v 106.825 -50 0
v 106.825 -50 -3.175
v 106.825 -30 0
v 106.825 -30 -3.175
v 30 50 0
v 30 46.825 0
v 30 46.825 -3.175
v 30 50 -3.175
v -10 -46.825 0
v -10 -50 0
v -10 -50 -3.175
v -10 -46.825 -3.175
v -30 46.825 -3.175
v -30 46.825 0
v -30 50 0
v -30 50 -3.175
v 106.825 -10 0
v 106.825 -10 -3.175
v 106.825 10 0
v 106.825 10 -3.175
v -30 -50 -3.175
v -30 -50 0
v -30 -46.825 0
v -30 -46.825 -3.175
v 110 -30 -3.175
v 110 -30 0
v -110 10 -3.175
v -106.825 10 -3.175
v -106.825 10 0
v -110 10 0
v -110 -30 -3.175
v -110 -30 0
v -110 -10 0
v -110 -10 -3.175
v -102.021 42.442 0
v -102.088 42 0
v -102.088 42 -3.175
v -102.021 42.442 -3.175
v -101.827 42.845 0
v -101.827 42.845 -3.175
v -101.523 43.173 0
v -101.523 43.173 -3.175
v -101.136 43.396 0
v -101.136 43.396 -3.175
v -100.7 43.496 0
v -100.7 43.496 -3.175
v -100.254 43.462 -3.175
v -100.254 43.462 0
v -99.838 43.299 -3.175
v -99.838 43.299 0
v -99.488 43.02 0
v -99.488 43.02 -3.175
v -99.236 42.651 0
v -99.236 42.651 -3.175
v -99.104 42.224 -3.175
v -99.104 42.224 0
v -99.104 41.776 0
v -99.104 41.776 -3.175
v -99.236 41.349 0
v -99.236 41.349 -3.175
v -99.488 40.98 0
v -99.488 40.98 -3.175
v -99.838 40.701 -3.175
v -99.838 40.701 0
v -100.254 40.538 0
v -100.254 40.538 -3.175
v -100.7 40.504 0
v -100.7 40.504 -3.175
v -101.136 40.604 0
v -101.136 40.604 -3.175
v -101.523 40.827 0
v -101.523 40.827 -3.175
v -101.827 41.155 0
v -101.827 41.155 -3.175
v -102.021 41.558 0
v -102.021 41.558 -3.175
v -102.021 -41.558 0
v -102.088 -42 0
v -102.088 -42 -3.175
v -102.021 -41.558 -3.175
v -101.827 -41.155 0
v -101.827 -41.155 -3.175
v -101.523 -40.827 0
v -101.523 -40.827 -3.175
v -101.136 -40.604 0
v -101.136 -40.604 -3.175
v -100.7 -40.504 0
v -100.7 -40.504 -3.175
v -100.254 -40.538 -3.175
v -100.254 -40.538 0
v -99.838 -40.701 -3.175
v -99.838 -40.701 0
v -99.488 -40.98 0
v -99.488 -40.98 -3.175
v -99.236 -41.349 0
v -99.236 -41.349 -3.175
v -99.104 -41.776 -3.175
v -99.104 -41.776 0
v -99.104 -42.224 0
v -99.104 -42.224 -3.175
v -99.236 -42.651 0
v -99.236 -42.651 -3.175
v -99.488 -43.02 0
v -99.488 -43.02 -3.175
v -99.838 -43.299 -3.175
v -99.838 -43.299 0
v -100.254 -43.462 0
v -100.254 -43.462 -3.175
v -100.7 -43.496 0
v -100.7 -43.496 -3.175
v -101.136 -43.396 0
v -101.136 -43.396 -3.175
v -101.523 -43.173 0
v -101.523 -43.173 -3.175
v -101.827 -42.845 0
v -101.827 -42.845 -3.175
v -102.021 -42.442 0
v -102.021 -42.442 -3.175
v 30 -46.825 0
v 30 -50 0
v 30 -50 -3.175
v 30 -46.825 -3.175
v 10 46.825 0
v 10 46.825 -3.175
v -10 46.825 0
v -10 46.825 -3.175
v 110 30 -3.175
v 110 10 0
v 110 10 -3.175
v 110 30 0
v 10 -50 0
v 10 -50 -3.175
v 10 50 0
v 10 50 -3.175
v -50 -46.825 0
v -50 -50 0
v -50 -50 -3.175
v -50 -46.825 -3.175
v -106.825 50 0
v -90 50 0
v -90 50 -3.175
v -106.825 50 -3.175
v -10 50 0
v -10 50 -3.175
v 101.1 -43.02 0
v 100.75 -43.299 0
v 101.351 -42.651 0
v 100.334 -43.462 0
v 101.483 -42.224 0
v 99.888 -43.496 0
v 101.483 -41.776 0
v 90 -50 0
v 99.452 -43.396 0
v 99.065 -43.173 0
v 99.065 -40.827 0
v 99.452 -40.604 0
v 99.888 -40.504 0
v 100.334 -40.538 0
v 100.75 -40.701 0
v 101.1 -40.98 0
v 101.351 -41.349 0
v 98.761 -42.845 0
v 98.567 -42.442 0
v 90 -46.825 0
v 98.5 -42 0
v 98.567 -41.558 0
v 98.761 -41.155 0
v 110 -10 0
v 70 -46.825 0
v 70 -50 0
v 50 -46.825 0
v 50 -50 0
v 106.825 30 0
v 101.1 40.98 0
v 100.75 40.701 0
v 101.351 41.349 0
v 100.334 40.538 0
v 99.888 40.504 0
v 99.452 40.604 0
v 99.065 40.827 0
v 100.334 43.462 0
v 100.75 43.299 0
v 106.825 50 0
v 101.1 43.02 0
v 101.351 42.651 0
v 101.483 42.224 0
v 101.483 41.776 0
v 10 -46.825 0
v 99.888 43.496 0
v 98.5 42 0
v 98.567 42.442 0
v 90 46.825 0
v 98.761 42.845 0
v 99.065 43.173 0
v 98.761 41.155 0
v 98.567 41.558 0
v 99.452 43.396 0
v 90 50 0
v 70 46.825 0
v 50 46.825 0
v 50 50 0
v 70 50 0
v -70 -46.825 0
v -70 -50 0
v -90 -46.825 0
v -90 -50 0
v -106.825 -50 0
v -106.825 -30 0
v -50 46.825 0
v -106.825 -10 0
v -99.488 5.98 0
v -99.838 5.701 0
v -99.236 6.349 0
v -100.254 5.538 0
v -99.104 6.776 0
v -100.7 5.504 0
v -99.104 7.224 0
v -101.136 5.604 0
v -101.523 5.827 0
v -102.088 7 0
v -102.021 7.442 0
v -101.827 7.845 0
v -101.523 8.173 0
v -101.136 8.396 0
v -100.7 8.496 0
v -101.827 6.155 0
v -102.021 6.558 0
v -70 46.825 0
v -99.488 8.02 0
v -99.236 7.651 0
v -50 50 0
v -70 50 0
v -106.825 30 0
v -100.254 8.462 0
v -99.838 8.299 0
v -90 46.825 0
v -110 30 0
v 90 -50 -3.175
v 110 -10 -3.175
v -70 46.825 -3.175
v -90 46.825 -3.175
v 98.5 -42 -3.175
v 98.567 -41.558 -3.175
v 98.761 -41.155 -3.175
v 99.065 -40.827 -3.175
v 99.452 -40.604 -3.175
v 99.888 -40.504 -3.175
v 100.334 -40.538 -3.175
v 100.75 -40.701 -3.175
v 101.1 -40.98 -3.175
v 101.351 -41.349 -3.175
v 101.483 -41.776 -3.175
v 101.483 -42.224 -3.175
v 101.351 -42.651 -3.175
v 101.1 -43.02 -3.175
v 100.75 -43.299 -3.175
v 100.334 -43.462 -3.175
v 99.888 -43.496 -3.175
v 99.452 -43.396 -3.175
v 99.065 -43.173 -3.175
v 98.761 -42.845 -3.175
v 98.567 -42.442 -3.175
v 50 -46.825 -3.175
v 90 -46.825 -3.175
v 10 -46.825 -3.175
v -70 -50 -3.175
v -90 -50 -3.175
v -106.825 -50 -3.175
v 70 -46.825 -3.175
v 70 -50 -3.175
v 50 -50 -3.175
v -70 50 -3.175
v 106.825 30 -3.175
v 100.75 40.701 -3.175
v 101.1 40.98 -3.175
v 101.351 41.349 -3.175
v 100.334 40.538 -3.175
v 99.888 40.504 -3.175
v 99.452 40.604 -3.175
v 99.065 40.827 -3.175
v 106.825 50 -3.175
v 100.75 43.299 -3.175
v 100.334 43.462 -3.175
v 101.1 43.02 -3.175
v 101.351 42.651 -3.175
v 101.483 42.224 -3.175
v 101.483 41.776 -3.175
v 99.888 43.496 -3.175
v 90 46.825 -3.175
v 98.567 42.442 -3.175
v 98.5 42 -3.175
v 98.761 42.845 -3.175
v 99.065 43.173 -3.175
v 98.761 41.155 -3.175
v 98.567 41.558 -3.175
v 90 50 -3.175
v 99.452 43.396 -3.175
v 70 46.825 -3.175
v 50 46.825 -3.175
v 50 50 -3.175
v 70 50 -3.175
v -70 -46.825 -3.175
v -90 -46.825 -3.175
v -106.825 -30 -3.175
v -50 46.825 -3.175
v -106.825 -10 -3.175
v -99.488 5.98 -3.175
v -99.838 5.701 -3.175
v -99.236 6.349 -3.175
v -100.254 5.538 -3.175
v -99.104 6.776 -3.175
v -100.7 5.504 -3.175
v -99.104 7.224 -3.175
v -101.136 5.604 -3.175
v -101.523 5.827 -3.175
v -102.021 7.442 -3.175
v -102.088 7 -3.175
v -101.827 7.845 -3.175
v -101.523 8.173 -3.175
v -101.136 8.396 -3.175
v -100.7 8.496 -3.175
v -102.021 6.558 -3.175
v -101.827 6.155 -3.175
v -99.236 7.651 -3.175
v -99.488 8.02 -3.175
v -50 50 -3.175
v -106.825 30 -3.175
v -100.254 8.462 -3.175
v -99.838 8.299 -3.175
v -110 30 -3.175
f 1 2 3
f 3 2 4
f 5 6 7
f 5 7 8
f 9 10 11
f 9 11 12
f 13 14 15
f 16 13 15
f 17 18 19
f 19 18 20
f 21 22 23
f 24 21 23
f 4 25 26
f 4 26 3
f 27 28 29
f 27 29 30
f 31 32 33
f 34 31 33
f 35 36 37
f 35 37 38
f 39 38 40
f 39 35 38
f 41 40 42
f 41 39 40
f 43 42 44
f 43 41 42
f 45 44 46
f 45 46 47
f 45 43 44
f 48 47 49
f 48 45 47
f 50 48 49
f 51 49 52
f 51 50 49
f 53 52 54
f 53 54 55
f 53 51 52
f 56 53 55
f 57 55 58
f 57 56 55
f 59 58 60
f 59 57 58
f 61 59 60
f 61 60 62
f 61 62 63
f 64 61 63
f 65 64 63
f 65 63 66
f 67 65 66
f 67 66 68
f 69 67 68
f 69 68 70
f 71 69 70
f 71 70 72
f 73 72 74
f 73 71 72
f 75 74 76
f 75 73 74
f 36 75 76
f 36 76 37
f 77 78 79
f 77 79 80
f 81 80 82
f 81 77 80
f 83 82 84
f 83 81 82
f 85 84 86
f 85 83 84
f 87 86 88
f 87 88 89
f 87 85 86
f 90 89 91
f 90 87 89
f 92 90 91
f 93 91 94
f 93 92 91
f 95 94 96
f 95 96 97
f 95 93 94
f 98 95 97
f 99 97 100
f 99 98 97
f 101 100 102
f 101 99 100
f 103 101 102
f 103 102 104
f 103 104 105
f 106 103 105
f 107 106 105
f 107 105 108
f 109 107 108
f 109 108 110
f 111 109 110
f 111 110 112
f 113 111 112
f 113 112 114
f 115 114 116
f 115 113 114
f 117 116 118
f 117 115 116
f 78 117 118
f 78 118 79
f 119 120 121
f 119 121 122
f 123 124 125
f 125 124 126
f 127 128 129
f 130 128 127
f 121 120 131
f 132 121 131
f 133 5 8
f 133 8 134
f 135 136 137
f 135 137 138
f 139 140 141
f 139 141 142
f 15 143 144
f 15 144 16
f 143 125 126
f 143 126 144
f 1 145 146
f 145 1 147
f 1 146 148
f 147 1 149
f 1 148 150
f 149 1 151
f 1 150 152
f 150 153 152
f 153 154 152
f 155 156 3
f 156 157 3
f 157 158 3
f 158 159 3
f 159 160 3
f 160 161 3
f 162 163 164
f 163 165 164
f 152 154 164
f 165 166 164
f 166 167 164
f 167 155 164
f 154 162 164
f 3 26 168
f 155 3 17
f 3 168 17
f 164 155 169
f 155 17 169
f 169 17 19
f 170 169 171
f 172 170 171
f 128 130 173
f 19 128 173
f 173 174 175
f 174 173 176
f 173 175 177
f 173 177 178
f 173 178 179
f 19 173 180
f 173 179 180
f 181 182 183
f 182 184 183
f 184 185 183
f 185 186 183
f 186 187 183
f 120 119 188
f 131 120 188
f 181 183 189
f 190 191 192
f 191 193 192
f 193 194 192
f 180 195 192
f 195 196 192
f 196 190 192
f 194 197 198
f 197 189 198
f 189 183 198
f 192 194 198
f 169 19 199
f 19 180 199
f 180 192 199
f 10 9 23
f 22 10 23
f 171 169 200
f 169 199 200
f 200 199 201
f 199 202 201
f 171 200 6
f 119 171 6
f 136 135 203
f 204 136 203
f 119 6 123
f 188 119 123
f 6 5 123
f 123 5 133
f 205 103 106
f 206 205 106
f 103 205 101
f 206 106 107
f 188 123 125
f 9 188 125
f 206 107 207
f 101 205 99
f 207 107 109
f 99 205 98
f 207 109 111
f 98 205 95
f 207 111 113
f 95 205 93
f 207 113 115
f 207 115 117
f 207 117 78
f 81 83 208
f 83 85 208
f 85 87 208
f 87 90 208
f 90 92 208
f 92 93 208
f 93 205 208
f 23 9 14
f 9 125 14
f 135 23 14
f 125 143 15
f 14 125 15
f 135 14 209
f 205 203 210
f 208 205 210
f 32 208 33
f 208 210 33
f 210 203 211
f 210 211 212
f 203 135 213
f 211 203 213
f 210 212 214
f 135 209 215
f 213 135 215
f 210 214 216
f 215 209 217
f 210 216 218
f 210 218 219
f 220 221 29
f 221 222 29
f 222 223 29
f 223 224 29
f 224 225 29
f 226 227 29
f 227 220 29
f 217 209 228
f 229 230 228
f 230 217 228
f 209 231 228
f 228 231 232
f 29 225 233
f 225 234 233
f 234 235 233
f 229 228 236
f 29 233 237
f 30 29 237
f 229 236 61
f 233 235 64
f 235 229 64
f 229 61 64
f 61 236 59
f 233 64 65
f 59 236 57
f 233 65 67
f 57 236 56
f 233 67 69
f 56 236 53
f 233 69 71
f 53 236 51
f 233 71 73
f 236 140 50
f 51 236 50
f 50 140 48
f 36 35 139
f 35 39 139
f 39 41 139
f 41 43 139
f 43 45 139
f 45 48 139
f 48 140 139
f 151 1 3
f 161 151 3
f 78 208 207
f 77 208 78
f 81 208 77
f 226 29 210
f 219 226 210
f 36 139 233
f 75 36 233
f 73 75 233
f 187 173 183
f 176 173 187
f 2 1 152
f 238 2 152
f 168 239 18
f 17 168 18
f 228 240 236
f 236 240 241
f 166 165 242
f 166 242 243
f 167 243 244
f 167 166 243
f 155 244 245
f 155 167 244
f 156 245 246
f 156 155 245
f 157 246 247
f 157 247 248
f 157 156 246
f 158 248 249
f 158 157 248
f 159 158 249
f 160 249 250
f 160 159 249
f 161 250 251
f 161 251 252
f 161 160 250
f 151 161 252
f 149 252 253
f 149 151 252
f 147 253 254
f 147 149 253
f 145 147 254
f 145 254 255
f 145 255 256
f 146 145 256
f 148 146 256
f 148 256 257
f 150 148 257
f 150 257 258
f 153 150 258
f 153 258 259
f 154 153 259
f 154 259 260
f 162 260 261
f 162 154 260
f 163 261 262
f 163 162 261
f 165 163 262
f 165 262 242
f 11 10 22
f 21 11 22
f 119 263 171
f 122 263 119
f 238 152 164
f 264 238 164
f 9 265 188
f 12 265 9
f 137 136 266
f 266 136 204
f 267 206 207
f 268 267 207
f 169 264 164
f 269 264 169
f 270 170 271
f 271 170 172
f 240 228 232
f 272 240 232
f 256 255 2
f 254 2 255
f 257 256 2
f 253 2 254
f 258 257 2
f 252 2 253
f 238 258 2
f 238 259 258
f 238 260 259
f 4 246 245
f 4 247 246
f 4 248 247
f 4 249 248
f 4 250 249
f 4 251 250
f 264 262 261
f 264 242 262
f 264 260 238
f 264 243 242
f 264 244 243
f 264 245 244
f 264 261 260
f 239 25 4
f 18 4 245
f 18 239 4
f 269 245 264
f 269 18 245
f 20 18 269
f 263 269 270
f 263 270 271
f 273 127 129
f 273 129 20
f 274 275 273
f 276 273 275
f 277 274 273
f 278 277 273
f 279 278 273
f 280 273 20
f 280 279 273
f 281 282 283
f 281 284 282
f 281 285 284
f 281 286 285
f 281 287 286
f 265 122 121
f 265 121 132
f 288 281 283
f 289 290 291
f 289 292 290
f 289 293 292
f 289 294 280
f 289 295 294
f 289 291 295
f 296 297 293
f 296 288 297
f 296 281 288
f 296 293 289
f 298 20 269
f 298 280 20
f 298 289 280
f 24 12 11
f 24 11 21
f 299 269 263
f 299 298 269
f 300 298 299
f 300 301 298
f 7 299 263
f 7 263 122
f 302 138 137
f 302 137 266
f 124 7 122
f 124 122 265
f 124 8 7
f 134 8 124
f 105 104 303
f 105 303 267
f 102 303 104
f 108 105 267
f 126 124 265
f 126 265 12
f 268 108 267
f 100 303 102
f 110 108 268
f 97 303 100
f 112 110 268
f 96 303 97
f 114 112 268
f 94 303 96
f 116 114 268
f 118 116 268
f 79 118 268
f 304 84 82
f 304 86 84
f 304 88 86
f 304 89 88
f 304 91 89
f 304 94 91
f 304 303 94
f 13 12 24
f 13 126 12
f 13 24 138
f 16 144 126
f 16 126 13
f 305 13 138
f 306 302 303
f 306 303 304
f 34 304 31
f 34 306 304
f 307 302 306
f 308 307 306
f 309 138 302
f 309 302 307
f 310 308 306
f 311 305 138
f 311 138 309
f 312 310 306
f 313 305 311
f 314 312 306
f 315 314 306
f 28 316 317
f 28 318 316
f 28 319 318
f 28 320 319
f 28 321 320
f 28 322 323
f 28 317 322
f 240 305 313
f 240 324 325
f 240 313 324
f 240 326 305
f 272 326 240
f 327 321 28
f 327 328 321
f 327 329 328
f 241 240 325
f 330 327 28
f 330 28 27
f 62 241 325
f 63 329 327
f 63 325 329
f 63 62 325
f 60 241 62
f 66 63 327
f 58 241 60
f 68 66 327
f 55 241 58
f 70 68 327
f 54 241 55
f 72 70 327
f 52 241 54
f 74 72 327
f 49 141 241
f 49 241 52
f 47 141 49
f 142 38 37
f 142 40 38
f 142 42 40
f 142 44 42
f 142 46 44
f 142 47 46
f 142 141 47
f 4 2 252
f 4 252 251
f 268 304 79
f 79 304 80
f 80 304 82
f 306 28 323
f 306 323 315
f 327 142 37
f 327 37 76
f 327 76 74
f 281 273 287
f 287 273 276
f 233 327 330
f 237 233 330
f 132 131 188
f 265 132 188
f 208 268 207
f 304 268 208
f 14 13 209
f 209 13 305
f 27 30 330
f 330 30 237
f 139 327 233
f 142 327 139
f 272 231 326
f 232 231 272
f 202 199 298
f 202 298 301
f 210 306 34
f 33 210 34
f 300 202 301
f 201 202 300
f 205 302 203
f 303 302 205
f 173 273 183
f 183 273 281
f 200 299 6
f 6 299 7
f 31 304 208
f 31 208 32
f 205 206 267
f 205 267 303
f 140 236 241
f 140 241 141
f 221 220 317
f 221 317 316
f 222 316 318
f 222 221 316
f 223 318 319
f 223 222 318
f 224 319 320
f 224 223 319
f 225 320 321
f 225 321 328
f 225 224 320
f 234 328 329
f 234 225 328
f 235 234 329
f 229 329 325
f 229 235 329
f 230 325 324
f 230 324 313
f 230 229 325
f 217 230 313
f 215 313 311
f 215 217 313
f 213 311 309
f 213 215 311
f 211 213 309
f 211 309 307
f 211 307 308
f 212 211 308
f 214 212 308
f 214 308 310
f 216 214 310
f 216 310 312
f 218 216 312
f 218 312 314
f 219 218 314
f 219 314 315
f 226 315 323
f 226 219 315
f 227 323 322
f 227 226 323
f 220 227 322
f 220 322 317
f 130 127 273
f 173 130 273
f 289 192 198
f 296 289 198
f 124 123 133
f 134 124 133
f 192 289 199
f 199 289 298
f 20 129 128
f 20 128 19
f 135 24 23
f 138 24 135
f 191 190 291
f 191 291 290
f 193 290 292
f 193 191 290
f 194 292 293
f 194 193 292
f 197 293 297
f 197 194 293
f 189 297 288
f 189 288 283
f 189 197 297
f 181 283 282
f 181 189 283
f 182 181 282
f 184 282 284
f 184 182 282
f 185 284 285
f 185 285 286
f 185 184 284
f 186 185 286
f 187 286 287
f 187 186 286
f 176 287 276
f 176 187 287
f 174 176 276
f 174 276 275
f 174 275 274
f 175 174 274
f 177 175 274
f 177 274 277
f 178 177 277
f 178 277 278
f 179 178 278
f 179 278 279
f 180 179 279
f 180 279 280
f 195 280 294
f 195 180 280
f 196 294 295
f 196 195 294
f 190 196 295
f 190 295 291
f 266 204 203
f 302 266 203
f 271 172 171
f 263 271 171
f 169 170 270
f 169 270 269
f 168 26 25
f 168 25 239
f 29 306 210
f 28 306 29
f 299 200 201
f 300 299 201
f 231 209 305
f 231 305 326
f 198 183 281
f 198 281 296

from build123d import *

# Parameters (mm, degrees)
SKETCH51_W           = 220
SKETCH51_H           = 99.999981374
SKETCH51_R           = 1.5
BOSS_EXTRUDE13_DEPTH = 3.175
SKETCH52_W           = 3.175
SKETCH52_H           = 20
SKETCH52_W_2         = 20
SKETCH52_H_2         = 3.175
CUT_EXTRUDE25_DEPTH  = 3.175


with BuildPart() as part:
    # Sketch51 → Boss-Extrude13 (new body)
    with BuildSketch(Plane(origin=(0, 0, 0), x_dir=(-1, 0, 0), z_dir=(0, 0, -1))):
        with Locations((4.414e-06, 4.4643e-05)):
            Rectangle(SKETCH51_W, SKETCH51_H)
        with Locations((100.587627215, -41.999946044)):
            Circle(SKETCH51_R, mode=Mode.SUBTRACT)
        with Locations((100.587627215, 42.00003533)):
            Circle(SKETCH51_R, mode=Mode.SUBTRACT)
        with Locations((-99.9999958, -41.999946044)):
            Circle(SKETCH51_R, mode=Mode.SUBTRACT)
        with Locations((-99.9999958, 42.00003533)):
            Circle(SKETCH51_R, mode=Mode.SUBTRACT)
        with Locations((100.587627215, 7.000053956)):
            Circle(SKETCH51_R, mode=Mode.SUBTRACT)
    extrude(amount=BOSS_EXTRUDE13_DEPTH)

    # Sketch52 → Cut-Extrude25 (cut)
    with BuildSketch(Plane(origin=(0, 0, -3.175), x_dir=(-1, 0, 0), z_dir=(0, 0, -1))):
        with Locations((108.4125042, 3.533e-05)):
            Rectangle(SKETCH52_W, SKETCH52_H)
        with Locations((108.4125042, 40.00003533)):
            Rectangle(SKETCH52_W, SKETCH52_H)
        with Locations((108.4125042, -39.99996467)):
            Rectangle(SKETCH52_W, SKETCH52_H)
        with Locations((-108.4124958, 3.533e-05)):
            Rectangle(SKETCH52_W, SKETCH52_H)
        with Locations((-108.4124958, 40.00003533)):
            Rectangle(SKETCH52_W, SKETCH52_H)
        with Locations((-108.4124958, -39.99996467)):
            Rectangle(SKETCH52_W, SKETCH52_H)
        with Locations((40.0000042, 48.41253533)):
            Rectangle(SKETCH52_W_2, SKETCH52_H_2)
        with Locations((80.0000042, 48.41253533)):
            Rectangle(SKETCH52_W_2, SKETCH52_H_2)
        with Locations((4.2e-06, 48.41253533)):
            Rectangle(SKETCH52_W_2, SKETCH52_H_2)
        with Locations((-39.9999958, 48.41253533)):
            Rectangle(SKETCH52_W_2, SKETCH52_H_2)
        with Locations((-79.9999958, 48.41253533)):
            Rectangle(SKETCH52_W_2, SKETCH52_H_2)
        with Locations((40.0000042, -48.412446044)):
            Rectangle(SKETCH52_W_2, SKETCH52_H_2)
        with Locations((80.0000042, -48.412446044)):
            Rectangle(SKETCH52_W_2, SKETCH52_H_2)
        with Locations((4.2e-06, -48.412446044)):
            Rectangle(SKETCH52_W_2, SKETCH52_H_2)
        with Locations((-39.9999958, -48.412446044)):
            Rectangle(SKETCH52_W_2, SKETCH52_H_2)
        with Locations((-79.9999958, -48.412446044)):
            Rectangle(SKETCH52_W_2, SKETCH52_H_2)
    extrude(amount=-CUT_EXTRUDE25_DEPTH, mode=Mode.SUBTRACT)


solid = part.part
